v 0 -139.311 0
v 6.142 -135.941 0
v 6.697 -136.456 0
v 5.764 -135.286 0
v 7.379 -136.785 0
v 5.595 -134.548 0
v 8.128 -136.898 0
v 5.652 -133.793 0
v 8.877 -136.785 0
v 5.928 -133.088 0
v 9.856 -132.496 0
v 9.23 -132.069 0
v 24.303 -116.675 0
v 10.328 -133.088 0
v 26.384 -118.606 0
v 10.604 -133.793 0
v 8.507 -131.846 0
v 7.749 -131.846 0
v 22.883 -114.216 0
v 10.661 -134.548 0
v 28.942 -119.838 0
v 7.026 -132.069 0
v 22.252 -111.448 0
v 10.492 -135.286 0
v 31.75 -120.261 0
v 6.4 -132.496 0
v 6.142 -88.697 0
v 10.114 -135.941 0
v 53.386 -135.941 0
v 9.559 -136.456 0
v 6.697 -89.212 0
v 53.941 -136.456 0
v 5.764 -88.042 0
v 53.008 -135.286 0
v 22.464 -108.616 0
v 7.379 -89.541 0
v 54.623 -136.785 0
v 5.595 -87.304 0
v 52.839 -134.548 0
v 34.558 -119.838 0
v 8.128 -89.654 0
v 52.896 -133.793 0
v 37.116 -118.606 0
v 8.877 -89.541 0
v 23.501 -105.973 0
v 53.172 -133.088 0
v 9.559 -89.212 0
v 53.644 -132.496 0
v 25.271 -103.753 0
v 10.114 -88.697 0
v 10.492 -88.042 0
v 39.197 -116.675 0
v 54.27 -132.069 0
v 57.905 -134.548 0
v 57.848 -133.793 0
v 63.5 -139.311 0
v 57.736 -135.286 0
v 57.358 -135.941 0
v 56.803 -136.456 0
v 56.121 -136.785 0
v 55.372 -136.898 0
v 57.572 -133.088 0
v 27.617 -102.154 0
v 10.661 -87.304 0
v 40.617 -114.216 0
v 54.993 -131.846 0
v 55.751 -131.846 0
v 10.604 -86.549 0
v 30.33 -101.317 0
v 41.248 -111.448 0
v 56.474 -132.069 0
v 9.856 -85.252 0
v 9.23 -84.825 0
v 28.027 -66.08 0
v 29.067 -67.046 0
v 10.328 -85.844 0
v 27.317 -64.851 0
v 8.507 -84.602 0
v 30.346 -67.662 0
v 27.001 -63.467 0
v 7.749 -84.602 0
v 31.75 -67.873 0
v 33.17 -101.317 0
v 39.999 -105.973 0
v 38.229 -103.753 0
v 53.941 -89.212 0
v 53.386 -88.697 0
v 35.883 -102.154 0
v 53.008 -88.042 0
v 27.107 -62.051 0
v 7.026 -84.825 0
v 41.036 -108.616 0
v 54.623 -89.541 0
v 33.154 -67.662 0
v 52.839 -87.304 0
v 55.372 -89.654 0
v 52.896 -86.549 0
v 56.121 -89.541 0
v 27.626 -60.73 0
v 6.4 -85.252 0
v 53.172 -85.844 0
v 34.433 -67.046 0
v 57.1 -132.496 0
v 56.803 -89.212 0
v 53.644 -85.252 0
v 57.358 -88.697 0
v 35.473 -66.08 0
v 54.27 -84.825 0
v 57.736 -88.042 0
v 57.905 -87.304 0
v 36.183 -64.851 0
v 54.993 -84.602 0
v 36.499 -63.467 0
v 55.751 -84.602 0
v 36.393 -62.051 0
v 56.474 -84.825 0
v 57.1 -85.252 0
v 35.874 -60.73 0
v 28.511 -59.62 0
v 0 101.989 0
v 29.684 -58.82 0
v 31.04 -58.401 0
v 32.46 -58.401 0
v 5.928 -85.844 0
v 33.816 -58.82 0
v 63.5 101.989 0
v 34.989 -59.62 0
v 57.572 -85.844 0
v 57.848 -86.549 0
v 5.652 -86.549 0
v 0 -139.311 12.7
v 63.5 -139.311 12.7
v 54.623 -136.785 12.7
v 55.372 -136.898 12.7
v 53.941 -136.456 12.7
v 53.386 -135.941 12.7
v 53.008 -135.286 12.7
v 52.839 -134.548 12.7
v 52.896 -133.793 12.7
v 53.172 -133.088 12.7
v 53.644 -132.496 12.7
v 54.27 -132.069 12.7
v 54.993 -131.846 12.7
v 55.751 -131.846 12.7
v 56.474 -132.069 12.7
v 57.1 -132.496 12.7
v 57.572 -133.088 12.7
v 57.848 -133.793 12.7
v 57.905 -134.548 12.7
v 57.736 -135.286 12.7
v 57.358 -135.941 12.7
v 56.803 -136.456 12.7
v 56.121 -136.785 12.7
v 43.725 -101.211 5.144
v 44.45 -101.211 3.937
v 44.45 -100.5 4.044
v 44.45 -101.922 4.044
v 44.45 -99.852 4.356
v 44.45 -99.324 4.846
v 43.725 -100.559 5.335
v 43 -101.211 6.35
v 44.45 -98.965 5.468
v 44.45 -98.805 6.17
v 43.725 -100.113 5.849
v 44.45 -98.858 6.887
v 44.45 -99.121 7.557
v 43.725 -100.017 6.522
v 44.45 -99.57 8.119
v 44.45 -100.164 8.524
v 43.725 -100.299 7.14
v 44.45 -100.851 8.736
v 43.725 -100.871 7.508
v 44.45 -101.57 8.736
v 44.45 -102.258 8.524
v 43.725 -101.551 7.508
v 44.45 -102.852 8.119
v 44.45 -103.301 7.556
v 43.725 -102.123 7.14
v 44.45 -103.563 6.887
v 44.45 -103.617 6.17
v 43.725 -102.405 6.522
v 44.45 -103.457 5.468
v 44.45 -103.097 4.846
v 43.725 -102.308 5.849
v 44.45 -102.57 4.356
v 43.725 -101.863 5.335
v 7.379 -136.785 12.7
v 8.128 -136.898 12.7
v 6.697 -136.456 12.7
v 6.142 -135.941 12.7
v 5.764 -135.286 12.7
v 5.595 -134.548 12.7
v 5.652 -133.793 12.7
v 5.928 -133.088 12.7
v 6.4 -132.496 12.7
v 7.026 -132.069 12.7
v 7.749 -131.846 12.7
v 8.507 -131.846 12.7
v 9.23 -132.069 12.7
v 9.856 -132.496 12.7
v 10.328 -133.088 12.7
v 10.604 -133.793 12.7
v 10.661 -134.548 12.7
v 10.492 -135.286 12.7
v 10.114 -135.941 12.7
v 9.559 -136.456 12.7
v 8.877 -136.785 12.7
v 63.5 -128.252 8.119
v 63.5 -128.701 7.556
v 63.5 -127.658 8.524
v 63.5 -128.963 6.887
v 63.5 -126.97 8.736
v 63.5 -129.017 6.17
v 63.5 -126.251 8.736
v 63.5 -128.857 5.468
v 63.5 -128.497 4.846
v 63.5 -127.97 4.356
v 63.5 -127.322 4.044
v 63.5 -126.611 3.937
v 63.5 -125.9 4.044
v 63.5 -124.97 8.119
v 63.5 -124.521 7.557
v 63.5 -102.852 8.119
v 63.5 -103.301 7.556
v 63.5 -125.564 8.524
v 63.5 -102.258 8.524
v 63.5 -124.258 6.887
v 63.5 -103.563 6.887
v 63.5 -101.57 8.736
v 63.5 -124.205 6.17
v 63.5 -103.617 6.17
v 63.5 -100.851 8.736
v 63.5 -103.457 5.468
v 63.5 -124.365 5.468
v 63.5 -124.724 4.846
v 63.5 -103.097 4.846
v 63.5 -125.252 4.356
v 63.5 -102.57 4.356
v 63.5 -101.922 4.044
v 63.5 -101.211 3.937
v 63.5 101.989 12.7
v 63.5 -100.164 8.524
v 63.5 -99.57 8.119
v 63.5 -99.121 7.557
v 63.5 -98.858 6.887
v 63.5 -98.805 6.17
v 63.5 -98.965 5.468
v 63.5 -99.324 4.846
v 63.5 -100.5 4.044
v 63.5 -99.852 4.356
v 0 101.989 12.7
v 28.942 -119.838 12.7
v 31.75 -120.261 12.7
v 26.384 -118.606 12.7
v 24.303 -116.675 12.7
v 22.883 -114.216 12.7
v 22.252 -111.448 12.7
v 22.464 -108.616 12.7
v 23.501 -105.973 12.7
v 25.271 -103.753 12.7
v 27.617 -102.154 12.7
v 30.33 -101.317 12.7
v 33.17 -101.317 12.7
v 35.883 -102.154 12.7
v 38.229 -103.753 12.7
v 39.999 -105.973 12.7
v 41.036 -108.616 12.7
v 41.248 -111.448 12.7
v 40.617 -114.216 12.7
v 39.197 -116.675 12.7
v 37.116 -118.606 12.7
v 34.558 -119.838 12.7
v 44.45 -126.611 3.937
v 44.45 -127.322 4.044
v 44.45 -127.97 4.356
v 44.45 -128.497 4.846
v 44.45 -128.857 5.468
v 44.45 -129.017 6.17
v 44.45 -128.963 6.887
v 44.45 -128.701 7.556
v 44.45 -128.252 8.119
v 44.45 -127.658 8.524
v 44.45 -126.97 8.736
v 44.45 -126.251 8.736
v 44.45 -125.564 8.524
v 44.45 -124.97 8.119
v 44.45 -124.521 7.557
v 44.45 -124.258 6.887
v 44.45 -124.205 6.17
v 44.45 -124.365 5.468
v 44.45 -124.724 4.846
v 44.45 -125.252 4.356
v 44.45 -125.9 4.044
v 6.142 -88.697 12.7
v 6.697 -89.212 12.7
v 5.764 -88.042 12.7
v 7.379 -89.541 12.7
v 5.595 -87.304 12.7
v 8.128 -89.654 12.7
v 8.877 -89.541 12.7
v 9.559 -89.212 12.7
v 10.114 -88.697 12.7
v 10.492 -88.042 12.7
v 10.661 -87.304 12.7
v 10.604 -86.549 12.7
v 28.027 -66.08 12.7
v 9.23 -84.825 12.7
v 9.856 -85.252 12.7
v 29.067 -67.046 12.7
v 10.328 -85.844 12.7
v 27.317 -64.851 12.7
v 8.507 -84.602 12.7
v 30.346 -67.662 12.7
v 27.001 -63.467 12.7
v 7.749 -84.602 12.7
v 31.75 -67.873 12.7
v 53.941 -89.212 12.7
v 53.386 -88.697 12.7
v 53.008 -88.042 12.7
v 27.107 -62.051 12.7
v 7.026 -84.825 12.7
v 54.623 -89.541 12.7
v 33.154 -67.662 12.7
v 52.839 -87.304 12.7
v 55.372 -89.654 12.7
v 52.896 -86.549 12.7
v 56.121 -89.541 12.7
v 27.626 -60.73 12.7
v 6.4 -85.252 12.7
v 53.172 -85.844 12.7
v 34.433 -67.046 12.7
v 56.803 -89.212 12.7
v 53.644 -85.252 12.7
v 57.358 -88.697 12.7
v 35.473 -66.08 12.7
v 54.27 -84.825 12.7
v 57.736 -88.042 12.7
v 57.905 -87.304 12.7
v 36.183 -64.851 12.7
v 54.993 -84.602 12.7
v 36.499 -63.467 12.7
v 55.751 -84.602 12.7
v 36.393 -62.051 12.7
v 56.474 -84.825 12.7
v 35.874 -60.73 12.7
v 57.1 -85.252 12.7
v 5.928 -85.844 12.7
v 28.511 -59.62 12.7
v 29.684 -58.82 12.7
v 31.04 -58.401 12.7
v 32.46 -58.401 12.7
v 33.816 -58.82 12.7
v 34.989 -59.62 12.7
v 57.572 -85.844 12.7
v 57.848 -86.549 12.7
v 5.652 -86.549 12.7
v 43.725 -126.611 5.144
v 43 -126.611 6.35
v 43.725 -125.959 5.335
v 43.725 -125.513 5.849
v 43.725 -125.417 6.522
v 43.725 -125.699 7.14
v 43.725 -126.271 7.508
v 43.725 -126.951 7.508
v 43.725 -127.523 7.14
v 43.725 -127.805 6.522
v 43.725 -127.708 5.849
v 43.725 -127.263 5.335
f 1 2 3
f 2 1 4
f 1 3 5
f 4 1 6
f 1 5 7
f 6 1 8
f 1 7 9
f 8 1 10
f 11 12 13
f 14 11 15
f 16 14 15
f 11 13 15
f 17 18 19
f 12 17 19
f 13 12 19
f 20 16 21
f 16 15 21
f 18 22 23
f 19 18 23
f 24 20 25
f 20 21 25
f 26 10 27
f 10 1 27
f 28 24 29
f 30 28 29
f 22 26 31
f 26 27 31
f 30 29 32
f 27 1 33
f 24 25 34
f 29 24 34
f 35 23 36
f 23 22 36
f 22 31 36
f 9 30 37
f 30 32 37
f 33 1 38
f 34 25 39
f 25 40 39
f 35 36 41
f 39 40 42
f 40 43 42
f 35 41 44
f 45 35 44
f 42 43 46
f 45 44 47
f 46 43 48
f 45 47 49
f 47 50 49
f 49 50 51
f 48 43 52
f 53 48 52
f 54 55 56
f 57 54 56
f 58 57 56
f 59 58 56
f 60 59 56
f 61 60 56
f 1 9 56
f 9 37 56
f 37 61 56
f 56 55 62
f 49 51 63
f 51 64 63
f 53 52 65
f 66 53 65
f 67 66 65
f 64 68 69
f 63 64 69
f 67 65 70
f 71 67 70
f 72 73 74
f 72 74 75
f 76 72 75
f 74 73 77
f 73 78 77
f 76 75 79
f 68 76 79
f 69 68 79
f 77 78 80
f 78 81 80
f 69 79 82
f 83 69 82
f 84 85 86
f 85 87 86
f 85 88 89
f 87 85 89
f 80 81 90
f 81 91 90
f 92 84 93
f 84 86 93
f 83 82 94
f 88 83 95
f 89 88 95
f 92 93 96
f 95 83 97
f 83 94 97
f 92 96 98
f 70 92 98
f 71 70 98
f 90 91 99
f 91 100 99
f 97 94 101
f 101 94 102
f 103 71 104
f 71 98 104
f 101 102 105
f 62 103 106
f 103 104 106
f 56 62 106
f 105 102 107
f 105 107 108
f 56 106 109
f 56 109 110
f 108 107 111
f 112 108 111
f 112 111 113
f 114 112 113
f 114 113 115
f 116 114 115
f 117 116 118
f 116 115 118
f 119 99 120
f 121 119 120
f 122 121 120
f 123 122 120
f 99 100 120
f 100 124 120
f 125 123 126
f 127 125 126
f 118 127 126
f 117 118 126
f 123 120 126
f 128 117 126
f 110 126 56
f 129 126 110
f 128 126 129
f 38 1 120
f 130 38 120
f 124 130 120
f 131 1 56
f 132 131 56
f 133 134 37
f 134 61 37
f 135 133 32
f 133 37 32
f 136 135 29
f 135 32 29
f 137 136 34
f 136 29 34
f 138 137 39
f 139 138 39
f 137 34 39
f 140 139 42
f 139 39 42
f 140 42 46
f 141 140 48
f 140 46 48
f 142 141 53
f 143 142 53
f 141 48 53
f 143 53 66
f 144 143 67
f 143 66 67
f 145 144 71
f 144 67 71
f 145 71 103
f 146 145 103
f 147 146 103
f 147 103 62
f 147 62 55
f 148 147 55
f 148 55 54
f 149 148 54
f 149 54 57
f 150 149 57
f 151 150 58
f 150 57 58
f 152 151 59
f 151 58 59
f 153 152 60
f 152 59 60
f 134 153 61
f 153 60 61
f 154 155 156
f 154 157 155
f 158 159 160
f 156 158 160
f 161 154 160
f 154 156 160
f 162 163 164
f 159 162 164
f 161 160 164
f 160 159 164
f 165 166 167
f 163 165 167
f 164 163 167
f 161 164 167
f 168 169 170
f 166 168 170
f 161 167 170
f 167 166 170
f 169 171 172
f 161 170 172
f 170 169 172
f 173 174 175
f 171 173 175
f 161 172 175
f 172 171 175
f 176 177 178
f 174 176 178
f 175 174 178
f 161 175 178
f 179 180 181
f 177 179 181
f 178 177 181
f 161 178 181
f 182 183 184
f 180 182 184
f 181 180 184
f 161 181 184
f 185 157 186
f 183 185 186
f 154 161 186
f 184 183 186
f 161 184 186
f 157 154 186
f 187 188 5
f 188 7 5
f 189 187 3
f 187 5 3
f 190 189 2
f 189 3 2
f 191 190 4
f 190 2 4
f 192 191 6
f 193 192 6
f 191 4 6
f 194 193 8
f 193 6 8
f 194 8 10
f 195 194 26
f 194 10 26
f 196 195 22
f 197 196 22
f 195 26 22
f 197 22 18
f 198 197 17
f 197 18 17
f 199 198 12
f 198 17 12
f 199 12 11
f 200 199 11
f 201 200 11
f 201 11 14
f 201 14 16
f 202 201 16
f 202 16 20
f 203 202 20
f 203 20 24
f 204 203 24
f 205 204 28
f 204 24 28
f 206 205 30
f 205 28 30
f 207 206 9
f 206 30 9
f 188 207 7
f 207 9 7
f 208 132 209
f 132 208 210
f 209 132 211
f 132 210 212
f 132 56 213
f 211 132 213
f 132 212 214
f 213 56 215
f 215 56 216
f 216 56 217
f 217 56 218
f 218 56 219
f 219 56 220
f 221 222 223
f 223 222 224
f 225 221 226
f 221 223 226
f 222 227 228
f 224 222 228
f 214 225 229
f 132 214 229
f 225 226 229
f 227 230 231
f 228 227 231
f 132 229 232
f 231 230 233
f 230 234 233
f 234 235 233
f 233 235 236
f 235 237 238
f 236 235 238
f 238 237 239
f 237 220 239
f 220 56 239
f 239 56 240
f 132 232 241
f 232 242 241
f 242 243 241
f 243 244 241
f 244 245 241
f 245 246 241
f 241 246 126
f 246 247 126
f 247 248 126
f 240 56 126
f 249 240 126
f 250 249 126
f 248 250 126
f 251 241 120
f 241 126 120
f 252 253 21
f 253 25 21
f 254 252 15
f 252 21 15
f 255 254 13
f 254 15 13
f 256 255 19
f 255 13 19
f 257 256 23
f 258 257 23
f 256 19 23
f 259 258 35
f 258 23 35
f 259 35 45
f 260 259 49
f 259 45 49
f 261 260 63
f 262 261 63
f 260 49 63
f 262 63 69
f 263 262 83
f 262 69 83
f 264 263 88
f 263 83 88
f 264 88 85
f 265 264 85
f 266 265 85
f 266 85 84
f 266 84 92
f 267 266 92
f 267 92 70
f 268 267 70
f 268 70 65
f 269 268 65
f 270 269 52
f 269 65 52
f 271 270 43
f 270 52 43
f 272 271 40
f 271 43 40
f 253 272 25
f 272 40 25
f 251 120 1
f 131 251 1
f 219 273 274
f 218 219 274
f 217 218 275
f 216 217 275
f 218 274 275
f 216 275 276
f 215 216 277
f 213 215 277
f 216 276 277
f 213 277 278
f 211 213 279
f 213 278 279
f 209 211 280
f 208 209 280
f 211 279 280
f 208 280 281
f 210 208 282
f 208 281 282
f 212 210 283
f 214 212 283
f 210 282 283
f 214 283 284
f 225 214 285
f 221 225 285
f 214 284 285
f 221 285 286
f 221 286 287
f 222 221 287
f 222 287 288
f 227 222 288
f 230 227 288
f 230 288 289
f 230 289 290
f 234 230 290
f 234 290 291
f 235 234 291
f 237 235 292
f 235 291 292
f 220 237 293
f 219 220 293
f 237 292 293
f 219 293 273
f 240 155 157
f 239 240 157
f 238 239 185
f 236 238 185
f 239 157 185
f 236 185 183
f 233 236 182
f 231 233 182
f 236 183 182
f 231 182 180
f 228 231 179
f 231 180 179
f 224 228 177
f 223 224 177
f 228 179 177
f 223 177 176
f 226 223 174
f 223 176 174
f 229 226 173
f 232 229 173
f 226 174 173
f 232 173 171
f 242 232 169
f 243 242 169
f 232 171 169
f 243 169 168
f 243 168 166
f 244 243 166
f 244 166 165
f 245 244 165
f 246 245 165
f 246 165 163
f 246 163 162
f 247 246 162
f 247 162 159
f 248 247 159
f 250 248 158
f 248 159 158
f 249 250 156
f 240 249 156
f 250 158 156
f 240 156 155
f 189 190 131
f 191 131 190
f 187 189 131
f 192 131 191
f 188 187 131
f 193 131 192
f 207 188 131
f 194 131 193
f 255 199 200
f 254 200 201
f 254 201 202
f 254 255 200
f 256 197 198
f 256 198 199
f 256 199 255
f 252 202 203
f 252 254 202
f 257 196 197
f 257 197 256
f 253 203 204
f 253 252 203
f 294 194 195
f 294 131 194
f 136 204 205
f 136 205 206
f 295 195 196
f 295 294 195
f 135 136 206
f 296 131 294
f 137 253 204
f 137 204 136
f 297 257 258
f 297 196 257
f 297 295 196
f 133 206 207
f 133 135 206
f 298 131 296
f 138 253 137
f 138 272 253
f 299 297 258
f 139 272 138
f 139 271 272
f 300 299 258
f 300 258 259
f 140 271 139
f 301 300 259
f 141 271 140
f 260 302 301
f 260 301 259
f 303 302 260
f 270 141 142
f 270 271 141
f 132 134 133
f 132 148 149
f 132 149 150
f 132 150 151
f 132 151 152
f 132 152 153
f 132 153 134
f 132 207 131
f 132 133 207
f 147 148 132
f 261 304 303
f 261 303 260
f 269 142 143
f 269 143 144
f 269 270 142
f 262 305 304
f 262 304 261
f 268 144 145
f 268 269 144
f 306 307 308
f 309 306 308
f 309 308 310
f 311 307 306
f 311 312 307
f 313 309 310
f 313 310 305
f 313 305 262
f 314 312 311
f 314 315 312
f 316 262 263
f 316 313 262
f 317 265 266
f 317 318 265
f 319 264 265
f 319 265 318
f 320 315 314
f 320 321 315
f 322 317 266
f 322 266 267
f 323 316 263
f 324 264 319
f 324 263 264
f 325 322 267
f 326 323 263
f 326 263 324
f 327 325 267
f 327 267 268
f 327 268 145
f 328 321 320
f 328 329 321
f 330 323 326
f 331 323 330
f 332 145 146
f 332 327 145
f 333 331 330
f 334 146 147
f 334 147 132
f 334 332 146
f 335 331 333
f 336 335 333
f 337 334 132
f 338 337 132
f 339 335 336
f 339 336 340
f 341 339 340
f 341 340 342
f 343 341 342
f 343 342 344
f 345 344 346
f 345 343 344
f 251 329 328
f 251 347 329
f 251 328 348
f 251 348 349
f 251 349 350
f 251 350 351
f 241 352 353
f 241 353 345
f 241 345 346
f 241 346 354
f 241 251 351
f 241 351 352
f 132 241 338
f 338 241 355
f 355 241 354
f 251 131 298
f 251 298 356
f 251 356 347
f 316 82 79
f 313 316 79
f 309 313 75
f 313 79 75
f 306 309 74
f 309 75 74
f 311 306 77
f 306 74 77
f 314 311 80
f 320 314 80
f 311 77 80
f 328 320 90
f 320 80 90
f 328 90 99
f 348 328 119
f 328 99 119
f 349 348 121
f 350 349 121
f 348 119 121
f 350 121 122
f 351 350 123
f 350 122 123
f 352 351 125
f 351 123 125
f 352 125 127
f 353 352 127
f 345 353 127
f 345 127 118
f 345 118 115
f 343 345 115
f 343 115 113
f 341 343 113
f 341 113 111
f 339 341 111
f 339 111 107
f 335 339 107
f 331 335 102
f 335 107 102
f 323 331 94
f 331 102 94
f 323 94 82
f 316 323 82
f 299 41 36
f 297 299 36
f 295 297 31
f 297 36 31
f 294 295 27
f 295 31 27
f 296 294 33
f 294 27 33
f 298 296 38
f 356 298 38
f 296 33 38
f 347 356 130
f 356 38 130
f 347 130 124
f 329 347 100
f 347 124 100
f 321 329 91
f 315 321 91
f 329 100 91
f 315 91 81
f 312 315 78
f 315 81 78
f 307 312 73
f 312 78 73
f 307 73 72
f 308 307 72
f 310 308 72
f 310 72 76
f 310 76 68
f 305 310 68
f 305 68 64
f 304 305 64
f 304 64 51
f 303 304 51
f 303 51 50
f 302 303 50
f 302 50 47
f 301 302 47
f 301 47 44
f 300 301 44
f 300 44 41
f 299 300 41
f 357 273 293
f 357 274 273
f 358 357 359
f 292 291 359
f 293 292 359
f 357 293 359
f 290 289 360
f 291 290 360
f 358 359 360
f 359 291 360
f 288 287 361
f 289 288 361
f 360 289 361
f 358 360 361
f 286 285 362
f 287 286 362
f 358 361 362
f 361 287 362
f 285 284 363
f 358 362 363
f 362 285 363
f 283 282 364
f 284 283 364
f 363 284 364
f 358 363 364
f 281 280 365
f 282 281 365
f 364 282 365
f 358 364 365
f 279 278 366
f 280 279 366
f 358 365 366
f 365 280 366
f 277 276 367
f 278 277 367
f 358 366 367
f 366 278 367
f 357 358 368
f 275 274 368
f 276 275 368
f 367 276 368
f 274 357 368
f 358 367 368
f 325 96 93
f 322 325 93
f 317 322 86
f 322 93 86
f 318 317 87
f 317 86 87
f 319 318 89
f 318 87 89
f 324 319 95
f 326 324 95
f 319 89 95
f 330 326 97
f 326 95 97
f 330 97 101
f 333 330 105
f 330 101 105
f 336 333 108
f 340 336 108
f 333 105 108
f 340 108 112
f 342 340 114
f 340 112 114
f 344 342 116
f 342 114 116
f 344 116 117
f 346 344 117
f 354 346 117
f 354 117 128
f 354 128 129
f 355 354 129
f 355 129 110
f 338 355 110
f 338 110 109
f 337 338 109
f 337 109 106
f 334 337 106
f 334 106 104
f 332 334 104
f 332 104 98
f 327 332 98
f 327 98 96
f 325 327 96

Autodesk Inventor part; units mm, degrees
ref_plane "YZ Plane" through (0, 0, 0) normal (1, 0, 0) x (0, 1, 0)
ref_plane "XZ Plane" through (0, 0, 0) normal (0, 1, 0) x (-1, 0, 0)
ref_plane "XY Plane" through (0, 0, 0) normal (0, 0, 1) x (1, 0, 0)
sketch "Sketch1" plane through (0, 0, 0) normal (0, 0, 1) x (1, 0, 0)
  line L0 (0, -139.3108) -> (63.5, -139.3108)
  line L1 (63.5, -139.3108) -> (63.5, 101.9892)
  line L2 (63.5, 101.9892) -> (0, 101.9892)
  line L3 (0, 101.9892) -> (0, -139.3108)
  point P0 (0, 0)
  dimension "d0" = 63.5
  dimension "d1" = 241.3
extrude "Extrusion1" add sketch "Sketch1" along normal blind 12.7
hole "Hole15" at (8.128, -134.3578, 12.7) direction (0, 0, -1) diameter 5.08 end through all
hole "Hole16" at (55.372, -134.3578, 12.7) direction (0, 0, -1) diameter 5.08 end through all
hole "Hole17" at (8.128, -87.1138, 12.7) direction (0, 0, -1) diameter 5.08 end through all
hole "Hole18" at (55.372, -87.1138, 12.7) direction (0, 0, -1) diameter 5.08 end through all
hole "Hole19" at (31.75, -63.1108, 12.7) direction (0, 0, -1) diameter 9.525 end through all
hole "Hole20" at (31.75, -110.7358, 12.7) direction (0, 0, -1) diameter 19.05 end through all
sketch "Font" plane through (0, 0, 12.7) normal (0, 0, 1) x (1, 0, 0)
  circle A0 centre (31.75, -110.7358) radius 9.525 projected
  circle A1 centre (31.75, -63.1108) radius 4.7625 projected
  circle A2 centre (55.372, -87.1138) radius 2.54 projected
  circle A3 centre (8.128, -87.1138) radius 2.54 projected
  circle A4 centre (55.372, -134.3578) radius 2.54 projected
  circle A5 centre (8.128, -134.3578) radius 2.54 projected
  line L0 (0, -139.3108) -> (0, 101.9892) projected
  line L1 (63.5, -139.3108) -> (0, -139.3108) projected
  line L2 (63.5, 101.9892) -> (63.5, -139.3108) projected
  line L3 (0, 101.9892) -> (63.5, 101.9892) projected
  point P0 (0, 0)
  dimension "d220" = 241.3
  dimension "d221" = 5.08
  dimension "d222" = 9.525
  dimension "d223" = 19.05
  dimension "d224" = 8.128
  dimension "d225" = 4.953
  dimension "d226" = 28.575
  dimension "d227" = 76.2
  dimension "d228" = 8.128
  dimension "d229" = 4.953
  dimension "d230" = 52.197
  dimension "d231" = 52.197
  dimension "d238" = 31.75
sketch "bottom" plane through (0, -139.3108, 0) normal (0, -1, 0) x (1, 0, 0)
  line L0 (63.5, 12.7) -> (0, 12.7) projected
  line L1 (0, 0) -> (0, 12.7) projected
  line L2 (0, 0) -> (63.5, 0) projected
  line L3 (63.5, 0) -> (63.5, 12.7) projected
  point P0 (47.752, 6.35)
  point P1 (15.748, 6.35)
  dimension "d233" = 12.7
sketch "Right" plane through (63.5, -139.3108, 0) normal (1, 0, 0) x (0, 0, -1)
  line L0 (-12.7, 241.3) -> (-12.7, 0) projected
  line L1 (0, 0) -> (-12.7, 0) projected
  line L2 (0, 0) -> (0, 241.3) projected
  line L3 (0, 241.3) -> (-12.7, 241.3) projected
  point P0 (0, 139.3108)
hole "Hole25" at (63.5, -126.6108, 6.35) direction (-1, 0, 0) diameter 4.826 depth 19.05 tip angle 118
hole "Hole26" at (63.5, -101.2108, 6.35) direction (-1, 0, 0) diameter 4.826 depth 19.05 tip angle 118
sketch "Sketch6" plane through (63.5, -139.3108, 0) normal (1, 0, 0) x (0, 0, -1)
  circle A0 centre (-6.35, 38.1) radius 2.413 projected
  circle A1 centre (-6.35, 12.7) radius 2.413 projected
  line L0 (-12.7, 241.3) -> (-12.7, 0) projected
  line L1 (0, 0) -> (-12.7, 0) projected
  line L2 (0, 0) -> (0, 241.3) projected
  line L3 (0, 241.3) -> (-12.7, 241.3) projected
  point P0 (0, 139.3108)
  dimension "d257" = 4.826
  dimension "d260" = 38.1
  dimension "d261" = 12.7
properties part number "xtower1"
